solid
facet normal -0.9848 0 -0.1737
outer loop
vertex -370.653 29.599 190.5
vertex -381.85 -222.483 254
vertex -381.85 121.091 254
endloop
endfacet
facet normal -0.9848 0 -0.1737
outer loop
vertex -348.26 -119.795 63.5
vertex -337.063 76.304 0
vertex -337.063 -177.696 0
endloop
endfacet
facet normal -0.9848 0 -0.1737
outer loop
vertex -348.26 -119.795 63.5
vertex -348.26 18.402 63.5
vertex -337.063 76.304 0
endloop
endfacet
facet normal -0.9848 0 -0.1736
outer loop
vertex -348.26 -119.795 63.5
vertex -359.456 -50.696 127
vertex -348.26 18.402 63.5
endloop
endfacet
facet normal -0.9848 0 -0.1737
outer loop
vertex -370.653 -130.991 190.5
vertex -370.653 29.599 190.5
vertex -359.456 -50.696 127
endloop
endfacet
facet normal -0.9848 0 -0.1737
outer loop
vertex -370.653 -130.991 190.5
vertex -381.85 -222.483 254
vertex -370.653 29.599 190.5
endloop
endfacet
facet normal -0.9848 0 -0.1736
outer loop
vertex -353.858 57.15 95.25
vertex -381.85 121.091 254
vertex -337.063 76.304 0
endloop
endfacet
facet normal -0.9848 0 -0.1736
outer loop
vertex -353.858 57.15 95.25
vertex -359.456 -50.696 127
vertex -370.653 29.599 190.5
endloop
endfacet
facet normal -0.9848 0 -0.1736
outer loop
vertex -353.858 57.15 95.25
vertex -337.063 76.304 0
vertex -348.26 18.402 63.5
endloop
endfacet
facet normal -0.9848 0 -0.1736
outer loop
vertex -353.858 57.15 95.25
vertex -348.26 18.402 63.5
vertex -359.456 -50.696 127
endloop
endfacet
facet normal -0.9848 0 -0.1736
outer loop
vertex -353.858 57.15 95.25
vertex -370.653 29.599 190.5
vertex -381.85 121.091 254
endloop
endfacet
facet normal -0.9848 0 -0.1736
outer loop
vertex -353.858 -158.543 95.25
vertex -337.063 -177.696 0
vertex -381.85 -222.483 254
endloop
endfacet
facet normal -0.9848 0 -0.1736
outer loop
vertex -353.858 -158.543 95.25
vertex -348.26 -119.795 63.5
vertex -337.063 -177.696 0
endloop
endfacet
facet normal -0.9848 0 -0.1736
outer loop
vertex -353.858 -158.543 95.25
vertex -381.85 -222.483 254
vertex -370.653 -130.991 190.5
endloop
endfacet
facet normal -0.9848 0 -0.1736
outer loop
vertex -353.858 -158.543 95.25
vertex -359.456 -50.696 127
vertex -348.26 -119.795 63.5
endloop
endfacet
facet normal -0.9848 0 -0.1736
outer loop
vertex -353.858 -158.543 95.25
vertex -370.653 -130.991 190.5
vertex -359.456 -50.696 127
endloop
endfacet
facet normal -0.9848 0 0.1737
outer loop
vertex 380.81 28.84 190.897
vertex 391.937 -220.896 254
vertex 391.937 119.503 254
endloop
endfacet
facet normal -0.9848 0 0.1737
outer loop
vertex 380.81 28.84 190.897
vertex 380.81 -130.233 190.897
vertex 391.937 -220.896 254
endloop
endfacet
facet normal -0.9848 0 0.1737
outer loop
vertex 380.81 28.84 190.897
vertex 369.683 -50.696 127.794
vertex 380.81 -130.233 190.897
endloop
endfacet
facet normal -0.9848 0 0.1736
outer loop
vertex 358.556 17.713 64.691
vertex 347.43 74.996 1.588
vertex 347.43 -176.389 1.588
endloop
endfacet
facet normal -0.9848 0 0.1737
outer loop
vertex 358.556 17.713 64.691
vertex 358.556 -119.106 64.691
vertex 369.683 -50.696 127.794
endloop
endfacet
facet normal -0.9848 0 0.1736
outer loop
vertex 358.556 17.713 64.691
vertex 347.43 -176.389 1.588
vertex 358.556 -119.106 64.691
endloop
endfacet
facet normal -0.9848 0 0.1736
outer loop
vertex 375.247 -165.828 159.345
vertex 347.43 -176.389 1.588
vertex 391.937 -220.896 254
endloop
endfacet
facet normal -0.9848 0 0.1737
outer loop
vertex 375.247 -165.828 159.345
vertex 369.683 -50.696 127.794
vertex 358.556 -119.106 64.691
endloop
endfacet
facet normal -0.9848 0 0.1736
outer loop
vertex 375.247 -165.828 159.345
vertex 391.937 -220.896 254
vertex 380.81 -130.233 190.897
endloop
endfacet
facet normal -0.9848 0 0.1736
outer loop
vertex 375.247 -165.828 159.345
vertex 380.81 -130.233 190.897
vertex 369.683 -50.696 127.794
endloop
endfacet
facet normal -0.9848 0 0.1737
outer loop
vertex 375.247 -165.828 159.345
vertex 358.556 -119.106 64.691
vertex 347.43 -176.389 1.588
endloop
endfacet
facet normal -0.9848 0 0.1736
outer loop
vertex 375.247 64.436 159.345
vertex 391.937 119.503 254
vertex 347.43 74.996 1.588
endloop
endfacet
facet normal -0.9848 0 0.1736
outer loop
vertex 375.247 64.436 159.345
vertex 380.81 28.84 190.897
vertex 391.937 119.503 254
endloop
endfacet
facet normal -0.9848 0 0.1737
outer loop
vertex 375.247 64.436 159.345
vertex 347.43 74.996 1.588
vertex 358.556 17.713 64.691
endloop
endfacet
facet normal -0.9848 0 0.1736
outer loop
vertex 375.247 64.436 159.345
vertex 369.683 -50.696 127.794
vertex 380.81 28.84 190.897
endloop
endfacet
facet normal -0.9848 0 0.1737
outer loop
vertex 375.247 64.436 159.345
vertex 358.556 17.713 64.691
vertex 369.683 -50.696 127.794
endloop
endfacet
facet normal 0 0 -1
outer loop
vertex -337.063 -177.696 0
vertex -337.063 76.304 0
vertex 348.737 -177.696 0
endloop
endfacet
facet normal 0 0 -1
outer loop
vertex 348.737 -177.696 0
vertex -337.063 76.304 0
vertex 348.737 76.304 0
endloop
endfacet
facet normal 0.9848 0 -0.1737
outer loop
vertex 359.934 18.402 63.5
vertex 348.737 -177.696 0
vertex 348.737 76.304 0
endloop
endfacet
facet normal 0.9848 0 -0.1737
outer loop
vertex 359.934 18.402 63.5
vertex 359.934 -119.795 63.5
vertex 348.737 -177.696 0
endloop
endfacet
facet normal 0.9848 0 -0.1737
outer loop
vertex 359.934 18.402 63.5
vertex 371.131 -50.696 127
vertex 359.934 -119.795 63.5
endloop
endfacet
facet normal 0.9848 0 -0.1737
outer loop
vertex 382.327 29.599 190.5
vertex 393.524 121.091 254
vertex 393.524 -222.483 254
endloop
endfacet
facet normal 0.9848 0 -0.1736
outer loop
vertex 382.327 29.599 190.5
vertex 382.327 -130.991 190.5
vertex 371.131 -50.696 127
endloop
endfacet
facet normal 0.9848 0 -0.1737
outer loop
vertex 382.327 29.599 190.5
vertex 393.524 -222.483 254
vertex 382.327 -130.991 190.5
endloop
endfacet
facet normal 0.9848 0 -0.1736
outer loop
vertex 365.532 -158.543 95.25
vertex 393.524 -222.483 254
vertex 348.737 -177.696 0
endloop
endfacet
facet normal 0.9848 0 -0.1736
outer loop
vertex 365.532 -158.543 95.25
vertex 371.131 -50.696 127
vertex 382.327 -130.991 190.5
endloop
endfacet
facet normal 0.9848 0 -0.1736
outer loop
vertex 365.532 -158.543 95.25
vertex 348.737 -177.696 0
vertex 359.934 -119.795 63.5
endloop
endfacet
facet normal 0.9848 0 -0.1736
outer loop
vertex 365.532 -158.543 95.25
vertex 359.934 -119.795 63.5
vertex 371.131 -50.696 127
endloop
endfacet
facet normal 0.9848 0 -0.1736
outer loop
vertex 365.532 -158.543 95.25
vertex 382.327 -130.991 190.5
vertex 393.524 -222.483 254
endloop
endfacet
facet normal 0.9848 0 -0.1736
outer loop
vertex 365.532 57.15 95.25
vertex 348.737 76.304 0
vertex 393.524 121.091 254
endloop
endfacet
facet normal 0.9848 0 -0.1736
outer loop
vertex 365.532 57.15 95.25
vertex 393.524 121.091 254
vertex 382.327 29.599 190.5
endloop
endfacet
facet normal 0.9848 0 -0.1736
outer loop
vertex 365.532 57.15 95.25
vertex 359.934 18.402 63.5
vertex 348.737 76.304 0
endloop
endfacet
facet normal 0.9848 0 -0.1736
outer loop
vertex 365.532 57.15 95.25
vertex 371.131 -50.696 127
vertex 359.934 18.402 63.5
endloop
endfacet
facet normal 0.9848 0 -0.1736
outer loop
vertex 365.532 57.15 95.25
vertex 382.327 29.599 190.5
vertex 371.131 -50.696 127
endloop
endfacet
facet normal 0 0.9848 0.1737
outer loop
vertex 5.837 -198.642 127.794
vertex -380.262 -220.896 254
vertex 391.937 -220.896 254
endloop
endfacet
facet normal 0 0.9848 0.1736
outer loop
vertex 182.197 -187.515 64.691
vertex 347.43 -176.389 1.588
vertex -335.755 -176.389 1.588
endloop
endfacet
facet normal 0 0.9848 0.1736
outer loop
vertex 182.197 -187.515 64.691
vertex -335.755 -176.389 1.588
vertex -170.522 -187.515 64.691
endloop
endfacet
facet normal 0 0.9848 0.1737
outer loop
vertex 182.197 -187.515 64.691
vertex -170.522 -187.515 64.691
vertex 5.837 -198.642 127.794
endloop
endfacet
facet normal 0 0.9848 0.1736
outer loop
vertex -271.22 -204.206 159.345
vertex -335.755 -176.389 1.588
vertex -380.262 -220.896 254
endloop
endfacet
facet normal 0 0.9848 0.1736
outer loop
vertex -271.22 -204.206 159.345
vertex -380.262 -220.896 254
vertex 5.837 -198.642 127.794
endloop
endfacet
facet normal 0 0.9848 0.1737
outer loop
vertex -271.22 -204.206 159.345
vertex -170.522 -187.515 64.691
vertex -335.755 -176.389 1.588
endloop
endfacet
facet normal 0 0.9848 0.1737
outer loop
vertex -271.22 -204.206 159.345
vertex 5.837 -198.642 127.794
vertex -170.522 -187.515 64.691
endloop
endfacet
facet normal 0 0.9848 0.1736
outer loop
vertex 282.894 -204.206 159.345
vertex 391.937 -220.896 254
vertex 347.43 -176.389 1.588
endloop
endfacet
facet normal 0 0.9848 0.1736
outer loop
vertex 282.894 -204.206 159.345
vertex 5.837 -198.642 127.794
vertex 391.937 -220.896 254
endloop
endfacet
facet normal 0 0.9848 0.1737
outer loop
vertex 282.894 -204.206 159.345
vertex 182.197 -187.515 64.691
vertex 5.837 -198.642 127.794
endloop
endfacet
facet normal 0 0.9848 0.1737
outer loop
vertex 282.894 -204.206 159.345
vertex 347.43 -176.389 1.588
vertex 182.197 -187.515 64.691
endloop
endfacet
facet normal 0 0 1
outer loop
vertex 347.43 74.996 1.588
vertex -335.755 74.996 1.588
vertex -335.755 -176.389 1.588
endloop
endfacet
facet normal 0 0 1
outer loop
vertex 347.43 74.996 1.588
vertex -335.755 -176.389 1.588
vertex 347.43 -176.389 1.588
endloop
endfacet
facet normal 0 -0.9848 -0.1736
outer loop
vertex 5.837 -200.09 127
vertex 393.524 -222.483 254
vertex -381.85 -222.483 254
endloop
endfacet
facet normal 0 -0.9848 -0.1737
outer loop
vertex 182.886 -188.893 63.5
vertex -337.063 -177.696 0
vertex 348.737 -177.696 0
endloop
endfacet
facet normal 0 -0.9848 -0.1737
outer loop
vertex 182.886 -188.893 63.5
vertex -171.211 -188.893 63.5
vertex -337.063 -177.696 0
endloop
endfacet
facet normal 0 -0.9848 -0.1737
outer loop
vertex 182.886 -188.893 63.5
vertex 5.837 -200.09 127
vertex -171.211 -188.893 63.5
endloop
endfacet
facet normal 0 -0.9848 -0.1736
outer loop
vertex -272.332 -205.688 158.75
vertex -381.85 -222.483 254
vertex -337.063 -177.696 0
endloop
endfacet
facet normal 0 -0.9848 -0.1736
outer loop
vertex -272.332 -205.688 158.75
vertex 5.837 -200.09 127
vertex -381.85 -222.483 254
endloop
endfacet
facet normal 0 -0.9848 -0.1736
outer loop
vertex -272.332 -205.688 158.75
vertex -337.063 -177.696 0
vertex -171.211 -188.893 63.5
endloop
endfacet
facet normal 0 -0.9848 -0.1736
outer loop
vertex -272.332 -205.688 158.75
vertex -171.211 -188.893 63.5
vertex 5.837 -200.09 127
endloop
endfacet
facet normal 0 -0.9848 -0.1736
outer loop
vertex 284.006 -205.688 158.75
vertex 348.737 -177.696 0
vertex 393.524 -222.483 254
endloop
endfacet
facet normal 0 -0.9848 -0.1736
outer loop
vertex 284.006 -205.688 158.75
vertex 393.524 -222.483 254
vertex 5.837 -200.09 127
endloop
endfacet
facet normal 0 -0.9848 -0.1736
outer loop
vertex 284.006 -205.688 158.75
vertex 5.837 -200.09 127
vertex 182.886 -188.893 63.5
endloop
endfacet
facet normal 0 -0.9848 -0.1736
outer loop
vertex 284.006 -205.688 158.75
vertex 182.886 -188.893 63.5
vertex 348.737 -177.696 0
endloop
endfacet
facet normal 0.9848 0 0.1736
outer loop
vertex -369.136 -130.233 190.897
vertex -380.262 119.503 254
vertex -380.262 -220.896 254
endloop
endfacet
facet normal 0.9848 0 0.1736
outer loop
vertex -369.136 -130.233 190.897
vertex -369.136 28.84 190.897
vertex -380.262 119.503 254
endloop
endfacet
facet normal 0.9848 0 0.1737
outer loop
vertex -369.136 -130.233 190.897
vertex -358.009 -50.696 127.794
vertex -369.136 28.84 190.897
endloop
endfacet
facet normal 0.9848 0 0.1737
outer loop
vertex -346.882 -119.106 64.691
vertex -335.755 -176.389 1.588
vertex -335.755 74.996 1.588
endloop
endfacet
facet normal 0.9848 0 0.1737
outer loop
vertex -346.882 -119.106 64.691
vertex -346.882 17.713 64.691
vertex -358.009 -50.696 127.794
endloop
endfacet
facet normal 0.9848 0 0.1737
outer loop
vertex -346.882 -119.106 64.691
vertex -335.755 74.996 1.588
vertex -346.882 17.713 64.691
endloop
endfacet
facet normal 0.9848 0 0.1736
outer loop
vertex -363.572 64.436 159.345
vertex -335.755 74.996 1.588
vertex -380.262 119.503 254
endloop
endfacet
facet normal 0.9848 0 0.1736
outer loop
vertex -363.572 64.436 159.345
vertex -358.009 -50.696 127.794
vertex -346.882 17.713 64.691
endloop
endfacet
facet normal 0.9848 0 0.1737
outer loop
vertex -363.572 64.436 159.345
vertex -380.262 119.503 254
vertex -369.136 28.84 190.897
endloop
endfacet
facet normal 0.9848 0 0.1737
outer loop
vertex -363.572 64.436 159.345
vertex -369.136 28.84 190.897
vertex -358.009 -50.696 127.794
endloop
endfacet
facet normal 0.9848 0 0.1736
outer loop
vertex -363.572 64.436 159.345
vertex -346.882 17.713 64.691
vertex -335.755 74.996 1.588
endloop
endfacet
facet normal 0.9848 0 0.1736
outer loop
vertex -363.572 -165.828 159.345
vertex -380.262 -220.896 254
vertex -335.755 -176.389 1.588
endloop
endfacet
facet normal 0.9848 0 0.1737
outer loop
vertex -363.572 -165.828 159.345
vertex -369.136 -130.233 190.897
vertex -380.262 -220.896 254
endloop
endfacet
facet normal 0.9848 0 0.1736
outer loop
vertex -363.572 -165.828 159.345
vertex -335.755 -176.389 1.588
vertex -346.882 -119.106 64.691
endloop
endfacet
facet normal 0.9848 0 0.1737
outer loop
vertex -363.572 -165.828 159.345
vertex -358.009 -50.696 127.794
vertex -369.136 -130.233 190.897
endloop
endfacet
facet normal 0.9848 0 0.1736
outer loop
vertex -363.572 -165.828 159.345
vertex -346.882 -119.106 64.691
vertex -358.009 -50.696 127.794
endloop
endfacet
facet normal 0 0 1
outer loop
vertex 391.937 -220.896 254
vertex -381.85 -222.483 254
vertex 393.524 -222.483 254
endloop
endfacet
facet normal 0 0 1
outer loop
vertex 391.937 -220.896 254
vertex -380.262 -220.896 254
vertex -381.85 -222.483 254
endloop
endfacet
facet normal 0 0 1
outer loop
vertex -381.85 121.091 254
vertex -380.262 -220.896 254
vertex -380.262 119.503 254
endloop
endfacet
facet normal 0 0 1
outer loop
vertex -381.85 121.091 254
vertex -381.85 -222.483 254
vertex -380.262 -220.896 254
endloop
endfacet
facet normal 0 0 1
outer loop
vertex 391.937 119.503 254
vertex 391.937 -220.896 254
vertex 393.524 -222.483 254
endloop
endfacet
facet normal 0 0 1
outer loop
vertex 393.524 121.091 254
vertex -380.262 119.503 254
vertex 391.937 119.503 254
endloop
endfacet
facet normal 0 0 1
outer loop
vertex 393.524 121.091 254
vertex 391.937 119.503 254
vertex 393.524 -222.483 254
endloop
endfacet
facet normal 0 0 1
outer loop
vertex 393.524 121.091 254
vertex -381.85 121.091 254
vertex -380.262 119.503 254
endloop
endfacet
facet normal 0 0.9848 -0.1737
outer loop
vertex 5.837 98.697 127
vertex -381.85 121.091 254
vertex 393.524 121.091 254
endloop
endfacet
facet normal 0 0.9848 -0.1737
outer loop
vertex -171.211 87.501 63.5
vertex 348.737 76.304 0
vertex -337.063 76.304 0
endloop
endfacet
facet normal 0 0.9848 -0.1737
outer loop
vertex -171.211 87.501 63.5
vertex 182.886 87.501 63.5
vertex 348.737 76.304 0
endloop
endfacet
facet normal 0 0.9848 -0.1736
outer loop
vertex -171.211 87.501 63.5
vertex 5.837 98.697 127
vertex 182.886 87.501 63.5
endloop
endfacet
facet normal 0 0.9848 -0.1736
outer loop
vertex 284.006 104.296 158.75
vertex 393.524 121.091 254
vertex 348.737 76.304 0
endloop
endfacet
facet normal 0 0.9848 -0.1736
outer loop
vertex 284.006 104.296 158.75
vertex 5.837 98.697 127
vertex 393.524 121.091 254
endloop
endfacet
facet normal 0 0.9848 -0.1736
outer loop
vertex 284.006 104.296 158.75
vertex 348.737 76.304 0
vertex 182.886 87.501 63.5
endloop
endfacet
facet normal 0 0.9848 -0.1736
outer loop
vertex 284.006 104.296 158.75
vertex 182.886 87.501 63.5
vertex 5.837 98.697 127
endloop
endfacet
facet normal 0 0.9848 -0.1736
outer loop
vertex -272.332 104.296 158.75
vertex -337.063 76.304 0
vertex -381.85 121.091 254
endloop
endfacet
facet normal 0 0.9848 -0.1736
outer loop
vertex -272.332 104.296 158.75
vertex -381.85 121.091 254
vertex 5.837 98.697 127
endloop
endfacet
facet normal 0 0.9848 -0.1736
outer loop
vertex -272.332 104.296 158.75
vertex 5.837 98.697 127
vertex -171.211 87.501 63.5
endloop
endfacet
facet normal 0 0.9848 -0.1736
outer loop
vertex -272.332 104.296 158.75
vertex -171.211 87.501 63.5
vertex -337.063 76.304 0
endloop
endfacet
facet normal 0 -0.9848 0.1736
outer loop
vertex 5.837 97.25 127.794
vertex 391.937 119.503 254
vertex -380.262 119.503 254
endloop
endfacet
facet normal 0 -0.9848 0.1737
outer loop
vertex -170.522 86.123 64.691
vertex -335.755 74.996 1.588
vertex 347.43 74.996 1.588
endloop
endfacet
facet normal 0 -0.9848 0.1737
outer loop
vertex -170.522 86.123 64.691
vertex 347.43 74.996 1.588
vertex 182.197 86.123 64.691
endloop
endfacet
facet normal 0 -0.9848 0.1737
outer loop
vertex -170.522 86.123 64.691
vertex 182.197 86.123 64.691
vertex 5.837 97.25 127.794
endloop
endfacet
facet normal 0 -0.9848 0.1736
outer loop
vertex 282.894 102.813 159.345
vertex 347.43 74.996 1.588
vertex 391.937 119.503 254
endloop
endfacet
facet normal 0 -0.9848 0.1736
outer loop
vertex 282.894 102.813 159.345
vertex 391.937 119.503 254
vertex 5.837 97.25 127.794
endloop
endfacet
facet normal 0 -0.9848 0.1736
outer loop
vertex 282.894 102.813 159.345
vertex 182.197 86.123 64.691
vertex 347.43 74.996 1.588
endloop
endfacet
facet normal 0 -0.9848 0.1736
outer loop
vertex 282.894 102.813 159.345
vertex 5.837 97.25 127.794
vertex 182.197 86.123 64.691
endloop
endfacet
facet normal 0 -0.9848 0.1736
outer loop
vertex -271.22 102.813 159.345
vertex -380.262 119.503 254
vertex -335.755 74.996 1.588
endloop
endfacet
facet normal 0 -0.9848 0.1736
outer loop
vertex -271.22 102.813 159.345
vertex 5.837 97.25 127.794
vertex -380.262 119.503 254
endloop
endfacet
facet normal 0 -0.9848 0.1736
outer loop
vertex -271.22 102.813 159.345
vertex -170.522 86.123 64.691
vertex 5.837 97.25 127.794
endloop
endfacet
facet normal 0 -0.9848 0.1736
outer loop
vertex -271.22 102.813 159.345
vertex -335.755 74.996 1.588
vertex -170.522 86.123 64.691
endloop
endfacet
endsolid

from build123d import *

# Parameters (mm, degrees)
F0_W     = 685.8
F0_H     = 254
F1_DEPTH = 254
F1_TAPER = -10
F2_W     = 772.1991061999
F2_H     = 340.3991061999
F3_DEPTH = 252.4125
F3_TAPER = 10


with BuildPart() as f1:
    # F0 (on Top) → F1 (new body)
    with BuildSketch(Plane.XY):
        with Locations((5.8371908963, -50.6961728707)):
            Rectangle(F0_W, F0_H)
    extrude(amount=F1_DEPTH, taper=F1_TAPER)

    # F2 (on face) → F3 (cut)
    with BuildSketch(Plane.XY.offset(254)):
        with Locations((5.8371908963, -50.6961728707)):
            Rectangle(F2_W, F2_H)
    extrude(amount=-F3_DEPTH, taper=F3_TAPER, mode=Mode.SUBTRACT)


solid = f1.part
